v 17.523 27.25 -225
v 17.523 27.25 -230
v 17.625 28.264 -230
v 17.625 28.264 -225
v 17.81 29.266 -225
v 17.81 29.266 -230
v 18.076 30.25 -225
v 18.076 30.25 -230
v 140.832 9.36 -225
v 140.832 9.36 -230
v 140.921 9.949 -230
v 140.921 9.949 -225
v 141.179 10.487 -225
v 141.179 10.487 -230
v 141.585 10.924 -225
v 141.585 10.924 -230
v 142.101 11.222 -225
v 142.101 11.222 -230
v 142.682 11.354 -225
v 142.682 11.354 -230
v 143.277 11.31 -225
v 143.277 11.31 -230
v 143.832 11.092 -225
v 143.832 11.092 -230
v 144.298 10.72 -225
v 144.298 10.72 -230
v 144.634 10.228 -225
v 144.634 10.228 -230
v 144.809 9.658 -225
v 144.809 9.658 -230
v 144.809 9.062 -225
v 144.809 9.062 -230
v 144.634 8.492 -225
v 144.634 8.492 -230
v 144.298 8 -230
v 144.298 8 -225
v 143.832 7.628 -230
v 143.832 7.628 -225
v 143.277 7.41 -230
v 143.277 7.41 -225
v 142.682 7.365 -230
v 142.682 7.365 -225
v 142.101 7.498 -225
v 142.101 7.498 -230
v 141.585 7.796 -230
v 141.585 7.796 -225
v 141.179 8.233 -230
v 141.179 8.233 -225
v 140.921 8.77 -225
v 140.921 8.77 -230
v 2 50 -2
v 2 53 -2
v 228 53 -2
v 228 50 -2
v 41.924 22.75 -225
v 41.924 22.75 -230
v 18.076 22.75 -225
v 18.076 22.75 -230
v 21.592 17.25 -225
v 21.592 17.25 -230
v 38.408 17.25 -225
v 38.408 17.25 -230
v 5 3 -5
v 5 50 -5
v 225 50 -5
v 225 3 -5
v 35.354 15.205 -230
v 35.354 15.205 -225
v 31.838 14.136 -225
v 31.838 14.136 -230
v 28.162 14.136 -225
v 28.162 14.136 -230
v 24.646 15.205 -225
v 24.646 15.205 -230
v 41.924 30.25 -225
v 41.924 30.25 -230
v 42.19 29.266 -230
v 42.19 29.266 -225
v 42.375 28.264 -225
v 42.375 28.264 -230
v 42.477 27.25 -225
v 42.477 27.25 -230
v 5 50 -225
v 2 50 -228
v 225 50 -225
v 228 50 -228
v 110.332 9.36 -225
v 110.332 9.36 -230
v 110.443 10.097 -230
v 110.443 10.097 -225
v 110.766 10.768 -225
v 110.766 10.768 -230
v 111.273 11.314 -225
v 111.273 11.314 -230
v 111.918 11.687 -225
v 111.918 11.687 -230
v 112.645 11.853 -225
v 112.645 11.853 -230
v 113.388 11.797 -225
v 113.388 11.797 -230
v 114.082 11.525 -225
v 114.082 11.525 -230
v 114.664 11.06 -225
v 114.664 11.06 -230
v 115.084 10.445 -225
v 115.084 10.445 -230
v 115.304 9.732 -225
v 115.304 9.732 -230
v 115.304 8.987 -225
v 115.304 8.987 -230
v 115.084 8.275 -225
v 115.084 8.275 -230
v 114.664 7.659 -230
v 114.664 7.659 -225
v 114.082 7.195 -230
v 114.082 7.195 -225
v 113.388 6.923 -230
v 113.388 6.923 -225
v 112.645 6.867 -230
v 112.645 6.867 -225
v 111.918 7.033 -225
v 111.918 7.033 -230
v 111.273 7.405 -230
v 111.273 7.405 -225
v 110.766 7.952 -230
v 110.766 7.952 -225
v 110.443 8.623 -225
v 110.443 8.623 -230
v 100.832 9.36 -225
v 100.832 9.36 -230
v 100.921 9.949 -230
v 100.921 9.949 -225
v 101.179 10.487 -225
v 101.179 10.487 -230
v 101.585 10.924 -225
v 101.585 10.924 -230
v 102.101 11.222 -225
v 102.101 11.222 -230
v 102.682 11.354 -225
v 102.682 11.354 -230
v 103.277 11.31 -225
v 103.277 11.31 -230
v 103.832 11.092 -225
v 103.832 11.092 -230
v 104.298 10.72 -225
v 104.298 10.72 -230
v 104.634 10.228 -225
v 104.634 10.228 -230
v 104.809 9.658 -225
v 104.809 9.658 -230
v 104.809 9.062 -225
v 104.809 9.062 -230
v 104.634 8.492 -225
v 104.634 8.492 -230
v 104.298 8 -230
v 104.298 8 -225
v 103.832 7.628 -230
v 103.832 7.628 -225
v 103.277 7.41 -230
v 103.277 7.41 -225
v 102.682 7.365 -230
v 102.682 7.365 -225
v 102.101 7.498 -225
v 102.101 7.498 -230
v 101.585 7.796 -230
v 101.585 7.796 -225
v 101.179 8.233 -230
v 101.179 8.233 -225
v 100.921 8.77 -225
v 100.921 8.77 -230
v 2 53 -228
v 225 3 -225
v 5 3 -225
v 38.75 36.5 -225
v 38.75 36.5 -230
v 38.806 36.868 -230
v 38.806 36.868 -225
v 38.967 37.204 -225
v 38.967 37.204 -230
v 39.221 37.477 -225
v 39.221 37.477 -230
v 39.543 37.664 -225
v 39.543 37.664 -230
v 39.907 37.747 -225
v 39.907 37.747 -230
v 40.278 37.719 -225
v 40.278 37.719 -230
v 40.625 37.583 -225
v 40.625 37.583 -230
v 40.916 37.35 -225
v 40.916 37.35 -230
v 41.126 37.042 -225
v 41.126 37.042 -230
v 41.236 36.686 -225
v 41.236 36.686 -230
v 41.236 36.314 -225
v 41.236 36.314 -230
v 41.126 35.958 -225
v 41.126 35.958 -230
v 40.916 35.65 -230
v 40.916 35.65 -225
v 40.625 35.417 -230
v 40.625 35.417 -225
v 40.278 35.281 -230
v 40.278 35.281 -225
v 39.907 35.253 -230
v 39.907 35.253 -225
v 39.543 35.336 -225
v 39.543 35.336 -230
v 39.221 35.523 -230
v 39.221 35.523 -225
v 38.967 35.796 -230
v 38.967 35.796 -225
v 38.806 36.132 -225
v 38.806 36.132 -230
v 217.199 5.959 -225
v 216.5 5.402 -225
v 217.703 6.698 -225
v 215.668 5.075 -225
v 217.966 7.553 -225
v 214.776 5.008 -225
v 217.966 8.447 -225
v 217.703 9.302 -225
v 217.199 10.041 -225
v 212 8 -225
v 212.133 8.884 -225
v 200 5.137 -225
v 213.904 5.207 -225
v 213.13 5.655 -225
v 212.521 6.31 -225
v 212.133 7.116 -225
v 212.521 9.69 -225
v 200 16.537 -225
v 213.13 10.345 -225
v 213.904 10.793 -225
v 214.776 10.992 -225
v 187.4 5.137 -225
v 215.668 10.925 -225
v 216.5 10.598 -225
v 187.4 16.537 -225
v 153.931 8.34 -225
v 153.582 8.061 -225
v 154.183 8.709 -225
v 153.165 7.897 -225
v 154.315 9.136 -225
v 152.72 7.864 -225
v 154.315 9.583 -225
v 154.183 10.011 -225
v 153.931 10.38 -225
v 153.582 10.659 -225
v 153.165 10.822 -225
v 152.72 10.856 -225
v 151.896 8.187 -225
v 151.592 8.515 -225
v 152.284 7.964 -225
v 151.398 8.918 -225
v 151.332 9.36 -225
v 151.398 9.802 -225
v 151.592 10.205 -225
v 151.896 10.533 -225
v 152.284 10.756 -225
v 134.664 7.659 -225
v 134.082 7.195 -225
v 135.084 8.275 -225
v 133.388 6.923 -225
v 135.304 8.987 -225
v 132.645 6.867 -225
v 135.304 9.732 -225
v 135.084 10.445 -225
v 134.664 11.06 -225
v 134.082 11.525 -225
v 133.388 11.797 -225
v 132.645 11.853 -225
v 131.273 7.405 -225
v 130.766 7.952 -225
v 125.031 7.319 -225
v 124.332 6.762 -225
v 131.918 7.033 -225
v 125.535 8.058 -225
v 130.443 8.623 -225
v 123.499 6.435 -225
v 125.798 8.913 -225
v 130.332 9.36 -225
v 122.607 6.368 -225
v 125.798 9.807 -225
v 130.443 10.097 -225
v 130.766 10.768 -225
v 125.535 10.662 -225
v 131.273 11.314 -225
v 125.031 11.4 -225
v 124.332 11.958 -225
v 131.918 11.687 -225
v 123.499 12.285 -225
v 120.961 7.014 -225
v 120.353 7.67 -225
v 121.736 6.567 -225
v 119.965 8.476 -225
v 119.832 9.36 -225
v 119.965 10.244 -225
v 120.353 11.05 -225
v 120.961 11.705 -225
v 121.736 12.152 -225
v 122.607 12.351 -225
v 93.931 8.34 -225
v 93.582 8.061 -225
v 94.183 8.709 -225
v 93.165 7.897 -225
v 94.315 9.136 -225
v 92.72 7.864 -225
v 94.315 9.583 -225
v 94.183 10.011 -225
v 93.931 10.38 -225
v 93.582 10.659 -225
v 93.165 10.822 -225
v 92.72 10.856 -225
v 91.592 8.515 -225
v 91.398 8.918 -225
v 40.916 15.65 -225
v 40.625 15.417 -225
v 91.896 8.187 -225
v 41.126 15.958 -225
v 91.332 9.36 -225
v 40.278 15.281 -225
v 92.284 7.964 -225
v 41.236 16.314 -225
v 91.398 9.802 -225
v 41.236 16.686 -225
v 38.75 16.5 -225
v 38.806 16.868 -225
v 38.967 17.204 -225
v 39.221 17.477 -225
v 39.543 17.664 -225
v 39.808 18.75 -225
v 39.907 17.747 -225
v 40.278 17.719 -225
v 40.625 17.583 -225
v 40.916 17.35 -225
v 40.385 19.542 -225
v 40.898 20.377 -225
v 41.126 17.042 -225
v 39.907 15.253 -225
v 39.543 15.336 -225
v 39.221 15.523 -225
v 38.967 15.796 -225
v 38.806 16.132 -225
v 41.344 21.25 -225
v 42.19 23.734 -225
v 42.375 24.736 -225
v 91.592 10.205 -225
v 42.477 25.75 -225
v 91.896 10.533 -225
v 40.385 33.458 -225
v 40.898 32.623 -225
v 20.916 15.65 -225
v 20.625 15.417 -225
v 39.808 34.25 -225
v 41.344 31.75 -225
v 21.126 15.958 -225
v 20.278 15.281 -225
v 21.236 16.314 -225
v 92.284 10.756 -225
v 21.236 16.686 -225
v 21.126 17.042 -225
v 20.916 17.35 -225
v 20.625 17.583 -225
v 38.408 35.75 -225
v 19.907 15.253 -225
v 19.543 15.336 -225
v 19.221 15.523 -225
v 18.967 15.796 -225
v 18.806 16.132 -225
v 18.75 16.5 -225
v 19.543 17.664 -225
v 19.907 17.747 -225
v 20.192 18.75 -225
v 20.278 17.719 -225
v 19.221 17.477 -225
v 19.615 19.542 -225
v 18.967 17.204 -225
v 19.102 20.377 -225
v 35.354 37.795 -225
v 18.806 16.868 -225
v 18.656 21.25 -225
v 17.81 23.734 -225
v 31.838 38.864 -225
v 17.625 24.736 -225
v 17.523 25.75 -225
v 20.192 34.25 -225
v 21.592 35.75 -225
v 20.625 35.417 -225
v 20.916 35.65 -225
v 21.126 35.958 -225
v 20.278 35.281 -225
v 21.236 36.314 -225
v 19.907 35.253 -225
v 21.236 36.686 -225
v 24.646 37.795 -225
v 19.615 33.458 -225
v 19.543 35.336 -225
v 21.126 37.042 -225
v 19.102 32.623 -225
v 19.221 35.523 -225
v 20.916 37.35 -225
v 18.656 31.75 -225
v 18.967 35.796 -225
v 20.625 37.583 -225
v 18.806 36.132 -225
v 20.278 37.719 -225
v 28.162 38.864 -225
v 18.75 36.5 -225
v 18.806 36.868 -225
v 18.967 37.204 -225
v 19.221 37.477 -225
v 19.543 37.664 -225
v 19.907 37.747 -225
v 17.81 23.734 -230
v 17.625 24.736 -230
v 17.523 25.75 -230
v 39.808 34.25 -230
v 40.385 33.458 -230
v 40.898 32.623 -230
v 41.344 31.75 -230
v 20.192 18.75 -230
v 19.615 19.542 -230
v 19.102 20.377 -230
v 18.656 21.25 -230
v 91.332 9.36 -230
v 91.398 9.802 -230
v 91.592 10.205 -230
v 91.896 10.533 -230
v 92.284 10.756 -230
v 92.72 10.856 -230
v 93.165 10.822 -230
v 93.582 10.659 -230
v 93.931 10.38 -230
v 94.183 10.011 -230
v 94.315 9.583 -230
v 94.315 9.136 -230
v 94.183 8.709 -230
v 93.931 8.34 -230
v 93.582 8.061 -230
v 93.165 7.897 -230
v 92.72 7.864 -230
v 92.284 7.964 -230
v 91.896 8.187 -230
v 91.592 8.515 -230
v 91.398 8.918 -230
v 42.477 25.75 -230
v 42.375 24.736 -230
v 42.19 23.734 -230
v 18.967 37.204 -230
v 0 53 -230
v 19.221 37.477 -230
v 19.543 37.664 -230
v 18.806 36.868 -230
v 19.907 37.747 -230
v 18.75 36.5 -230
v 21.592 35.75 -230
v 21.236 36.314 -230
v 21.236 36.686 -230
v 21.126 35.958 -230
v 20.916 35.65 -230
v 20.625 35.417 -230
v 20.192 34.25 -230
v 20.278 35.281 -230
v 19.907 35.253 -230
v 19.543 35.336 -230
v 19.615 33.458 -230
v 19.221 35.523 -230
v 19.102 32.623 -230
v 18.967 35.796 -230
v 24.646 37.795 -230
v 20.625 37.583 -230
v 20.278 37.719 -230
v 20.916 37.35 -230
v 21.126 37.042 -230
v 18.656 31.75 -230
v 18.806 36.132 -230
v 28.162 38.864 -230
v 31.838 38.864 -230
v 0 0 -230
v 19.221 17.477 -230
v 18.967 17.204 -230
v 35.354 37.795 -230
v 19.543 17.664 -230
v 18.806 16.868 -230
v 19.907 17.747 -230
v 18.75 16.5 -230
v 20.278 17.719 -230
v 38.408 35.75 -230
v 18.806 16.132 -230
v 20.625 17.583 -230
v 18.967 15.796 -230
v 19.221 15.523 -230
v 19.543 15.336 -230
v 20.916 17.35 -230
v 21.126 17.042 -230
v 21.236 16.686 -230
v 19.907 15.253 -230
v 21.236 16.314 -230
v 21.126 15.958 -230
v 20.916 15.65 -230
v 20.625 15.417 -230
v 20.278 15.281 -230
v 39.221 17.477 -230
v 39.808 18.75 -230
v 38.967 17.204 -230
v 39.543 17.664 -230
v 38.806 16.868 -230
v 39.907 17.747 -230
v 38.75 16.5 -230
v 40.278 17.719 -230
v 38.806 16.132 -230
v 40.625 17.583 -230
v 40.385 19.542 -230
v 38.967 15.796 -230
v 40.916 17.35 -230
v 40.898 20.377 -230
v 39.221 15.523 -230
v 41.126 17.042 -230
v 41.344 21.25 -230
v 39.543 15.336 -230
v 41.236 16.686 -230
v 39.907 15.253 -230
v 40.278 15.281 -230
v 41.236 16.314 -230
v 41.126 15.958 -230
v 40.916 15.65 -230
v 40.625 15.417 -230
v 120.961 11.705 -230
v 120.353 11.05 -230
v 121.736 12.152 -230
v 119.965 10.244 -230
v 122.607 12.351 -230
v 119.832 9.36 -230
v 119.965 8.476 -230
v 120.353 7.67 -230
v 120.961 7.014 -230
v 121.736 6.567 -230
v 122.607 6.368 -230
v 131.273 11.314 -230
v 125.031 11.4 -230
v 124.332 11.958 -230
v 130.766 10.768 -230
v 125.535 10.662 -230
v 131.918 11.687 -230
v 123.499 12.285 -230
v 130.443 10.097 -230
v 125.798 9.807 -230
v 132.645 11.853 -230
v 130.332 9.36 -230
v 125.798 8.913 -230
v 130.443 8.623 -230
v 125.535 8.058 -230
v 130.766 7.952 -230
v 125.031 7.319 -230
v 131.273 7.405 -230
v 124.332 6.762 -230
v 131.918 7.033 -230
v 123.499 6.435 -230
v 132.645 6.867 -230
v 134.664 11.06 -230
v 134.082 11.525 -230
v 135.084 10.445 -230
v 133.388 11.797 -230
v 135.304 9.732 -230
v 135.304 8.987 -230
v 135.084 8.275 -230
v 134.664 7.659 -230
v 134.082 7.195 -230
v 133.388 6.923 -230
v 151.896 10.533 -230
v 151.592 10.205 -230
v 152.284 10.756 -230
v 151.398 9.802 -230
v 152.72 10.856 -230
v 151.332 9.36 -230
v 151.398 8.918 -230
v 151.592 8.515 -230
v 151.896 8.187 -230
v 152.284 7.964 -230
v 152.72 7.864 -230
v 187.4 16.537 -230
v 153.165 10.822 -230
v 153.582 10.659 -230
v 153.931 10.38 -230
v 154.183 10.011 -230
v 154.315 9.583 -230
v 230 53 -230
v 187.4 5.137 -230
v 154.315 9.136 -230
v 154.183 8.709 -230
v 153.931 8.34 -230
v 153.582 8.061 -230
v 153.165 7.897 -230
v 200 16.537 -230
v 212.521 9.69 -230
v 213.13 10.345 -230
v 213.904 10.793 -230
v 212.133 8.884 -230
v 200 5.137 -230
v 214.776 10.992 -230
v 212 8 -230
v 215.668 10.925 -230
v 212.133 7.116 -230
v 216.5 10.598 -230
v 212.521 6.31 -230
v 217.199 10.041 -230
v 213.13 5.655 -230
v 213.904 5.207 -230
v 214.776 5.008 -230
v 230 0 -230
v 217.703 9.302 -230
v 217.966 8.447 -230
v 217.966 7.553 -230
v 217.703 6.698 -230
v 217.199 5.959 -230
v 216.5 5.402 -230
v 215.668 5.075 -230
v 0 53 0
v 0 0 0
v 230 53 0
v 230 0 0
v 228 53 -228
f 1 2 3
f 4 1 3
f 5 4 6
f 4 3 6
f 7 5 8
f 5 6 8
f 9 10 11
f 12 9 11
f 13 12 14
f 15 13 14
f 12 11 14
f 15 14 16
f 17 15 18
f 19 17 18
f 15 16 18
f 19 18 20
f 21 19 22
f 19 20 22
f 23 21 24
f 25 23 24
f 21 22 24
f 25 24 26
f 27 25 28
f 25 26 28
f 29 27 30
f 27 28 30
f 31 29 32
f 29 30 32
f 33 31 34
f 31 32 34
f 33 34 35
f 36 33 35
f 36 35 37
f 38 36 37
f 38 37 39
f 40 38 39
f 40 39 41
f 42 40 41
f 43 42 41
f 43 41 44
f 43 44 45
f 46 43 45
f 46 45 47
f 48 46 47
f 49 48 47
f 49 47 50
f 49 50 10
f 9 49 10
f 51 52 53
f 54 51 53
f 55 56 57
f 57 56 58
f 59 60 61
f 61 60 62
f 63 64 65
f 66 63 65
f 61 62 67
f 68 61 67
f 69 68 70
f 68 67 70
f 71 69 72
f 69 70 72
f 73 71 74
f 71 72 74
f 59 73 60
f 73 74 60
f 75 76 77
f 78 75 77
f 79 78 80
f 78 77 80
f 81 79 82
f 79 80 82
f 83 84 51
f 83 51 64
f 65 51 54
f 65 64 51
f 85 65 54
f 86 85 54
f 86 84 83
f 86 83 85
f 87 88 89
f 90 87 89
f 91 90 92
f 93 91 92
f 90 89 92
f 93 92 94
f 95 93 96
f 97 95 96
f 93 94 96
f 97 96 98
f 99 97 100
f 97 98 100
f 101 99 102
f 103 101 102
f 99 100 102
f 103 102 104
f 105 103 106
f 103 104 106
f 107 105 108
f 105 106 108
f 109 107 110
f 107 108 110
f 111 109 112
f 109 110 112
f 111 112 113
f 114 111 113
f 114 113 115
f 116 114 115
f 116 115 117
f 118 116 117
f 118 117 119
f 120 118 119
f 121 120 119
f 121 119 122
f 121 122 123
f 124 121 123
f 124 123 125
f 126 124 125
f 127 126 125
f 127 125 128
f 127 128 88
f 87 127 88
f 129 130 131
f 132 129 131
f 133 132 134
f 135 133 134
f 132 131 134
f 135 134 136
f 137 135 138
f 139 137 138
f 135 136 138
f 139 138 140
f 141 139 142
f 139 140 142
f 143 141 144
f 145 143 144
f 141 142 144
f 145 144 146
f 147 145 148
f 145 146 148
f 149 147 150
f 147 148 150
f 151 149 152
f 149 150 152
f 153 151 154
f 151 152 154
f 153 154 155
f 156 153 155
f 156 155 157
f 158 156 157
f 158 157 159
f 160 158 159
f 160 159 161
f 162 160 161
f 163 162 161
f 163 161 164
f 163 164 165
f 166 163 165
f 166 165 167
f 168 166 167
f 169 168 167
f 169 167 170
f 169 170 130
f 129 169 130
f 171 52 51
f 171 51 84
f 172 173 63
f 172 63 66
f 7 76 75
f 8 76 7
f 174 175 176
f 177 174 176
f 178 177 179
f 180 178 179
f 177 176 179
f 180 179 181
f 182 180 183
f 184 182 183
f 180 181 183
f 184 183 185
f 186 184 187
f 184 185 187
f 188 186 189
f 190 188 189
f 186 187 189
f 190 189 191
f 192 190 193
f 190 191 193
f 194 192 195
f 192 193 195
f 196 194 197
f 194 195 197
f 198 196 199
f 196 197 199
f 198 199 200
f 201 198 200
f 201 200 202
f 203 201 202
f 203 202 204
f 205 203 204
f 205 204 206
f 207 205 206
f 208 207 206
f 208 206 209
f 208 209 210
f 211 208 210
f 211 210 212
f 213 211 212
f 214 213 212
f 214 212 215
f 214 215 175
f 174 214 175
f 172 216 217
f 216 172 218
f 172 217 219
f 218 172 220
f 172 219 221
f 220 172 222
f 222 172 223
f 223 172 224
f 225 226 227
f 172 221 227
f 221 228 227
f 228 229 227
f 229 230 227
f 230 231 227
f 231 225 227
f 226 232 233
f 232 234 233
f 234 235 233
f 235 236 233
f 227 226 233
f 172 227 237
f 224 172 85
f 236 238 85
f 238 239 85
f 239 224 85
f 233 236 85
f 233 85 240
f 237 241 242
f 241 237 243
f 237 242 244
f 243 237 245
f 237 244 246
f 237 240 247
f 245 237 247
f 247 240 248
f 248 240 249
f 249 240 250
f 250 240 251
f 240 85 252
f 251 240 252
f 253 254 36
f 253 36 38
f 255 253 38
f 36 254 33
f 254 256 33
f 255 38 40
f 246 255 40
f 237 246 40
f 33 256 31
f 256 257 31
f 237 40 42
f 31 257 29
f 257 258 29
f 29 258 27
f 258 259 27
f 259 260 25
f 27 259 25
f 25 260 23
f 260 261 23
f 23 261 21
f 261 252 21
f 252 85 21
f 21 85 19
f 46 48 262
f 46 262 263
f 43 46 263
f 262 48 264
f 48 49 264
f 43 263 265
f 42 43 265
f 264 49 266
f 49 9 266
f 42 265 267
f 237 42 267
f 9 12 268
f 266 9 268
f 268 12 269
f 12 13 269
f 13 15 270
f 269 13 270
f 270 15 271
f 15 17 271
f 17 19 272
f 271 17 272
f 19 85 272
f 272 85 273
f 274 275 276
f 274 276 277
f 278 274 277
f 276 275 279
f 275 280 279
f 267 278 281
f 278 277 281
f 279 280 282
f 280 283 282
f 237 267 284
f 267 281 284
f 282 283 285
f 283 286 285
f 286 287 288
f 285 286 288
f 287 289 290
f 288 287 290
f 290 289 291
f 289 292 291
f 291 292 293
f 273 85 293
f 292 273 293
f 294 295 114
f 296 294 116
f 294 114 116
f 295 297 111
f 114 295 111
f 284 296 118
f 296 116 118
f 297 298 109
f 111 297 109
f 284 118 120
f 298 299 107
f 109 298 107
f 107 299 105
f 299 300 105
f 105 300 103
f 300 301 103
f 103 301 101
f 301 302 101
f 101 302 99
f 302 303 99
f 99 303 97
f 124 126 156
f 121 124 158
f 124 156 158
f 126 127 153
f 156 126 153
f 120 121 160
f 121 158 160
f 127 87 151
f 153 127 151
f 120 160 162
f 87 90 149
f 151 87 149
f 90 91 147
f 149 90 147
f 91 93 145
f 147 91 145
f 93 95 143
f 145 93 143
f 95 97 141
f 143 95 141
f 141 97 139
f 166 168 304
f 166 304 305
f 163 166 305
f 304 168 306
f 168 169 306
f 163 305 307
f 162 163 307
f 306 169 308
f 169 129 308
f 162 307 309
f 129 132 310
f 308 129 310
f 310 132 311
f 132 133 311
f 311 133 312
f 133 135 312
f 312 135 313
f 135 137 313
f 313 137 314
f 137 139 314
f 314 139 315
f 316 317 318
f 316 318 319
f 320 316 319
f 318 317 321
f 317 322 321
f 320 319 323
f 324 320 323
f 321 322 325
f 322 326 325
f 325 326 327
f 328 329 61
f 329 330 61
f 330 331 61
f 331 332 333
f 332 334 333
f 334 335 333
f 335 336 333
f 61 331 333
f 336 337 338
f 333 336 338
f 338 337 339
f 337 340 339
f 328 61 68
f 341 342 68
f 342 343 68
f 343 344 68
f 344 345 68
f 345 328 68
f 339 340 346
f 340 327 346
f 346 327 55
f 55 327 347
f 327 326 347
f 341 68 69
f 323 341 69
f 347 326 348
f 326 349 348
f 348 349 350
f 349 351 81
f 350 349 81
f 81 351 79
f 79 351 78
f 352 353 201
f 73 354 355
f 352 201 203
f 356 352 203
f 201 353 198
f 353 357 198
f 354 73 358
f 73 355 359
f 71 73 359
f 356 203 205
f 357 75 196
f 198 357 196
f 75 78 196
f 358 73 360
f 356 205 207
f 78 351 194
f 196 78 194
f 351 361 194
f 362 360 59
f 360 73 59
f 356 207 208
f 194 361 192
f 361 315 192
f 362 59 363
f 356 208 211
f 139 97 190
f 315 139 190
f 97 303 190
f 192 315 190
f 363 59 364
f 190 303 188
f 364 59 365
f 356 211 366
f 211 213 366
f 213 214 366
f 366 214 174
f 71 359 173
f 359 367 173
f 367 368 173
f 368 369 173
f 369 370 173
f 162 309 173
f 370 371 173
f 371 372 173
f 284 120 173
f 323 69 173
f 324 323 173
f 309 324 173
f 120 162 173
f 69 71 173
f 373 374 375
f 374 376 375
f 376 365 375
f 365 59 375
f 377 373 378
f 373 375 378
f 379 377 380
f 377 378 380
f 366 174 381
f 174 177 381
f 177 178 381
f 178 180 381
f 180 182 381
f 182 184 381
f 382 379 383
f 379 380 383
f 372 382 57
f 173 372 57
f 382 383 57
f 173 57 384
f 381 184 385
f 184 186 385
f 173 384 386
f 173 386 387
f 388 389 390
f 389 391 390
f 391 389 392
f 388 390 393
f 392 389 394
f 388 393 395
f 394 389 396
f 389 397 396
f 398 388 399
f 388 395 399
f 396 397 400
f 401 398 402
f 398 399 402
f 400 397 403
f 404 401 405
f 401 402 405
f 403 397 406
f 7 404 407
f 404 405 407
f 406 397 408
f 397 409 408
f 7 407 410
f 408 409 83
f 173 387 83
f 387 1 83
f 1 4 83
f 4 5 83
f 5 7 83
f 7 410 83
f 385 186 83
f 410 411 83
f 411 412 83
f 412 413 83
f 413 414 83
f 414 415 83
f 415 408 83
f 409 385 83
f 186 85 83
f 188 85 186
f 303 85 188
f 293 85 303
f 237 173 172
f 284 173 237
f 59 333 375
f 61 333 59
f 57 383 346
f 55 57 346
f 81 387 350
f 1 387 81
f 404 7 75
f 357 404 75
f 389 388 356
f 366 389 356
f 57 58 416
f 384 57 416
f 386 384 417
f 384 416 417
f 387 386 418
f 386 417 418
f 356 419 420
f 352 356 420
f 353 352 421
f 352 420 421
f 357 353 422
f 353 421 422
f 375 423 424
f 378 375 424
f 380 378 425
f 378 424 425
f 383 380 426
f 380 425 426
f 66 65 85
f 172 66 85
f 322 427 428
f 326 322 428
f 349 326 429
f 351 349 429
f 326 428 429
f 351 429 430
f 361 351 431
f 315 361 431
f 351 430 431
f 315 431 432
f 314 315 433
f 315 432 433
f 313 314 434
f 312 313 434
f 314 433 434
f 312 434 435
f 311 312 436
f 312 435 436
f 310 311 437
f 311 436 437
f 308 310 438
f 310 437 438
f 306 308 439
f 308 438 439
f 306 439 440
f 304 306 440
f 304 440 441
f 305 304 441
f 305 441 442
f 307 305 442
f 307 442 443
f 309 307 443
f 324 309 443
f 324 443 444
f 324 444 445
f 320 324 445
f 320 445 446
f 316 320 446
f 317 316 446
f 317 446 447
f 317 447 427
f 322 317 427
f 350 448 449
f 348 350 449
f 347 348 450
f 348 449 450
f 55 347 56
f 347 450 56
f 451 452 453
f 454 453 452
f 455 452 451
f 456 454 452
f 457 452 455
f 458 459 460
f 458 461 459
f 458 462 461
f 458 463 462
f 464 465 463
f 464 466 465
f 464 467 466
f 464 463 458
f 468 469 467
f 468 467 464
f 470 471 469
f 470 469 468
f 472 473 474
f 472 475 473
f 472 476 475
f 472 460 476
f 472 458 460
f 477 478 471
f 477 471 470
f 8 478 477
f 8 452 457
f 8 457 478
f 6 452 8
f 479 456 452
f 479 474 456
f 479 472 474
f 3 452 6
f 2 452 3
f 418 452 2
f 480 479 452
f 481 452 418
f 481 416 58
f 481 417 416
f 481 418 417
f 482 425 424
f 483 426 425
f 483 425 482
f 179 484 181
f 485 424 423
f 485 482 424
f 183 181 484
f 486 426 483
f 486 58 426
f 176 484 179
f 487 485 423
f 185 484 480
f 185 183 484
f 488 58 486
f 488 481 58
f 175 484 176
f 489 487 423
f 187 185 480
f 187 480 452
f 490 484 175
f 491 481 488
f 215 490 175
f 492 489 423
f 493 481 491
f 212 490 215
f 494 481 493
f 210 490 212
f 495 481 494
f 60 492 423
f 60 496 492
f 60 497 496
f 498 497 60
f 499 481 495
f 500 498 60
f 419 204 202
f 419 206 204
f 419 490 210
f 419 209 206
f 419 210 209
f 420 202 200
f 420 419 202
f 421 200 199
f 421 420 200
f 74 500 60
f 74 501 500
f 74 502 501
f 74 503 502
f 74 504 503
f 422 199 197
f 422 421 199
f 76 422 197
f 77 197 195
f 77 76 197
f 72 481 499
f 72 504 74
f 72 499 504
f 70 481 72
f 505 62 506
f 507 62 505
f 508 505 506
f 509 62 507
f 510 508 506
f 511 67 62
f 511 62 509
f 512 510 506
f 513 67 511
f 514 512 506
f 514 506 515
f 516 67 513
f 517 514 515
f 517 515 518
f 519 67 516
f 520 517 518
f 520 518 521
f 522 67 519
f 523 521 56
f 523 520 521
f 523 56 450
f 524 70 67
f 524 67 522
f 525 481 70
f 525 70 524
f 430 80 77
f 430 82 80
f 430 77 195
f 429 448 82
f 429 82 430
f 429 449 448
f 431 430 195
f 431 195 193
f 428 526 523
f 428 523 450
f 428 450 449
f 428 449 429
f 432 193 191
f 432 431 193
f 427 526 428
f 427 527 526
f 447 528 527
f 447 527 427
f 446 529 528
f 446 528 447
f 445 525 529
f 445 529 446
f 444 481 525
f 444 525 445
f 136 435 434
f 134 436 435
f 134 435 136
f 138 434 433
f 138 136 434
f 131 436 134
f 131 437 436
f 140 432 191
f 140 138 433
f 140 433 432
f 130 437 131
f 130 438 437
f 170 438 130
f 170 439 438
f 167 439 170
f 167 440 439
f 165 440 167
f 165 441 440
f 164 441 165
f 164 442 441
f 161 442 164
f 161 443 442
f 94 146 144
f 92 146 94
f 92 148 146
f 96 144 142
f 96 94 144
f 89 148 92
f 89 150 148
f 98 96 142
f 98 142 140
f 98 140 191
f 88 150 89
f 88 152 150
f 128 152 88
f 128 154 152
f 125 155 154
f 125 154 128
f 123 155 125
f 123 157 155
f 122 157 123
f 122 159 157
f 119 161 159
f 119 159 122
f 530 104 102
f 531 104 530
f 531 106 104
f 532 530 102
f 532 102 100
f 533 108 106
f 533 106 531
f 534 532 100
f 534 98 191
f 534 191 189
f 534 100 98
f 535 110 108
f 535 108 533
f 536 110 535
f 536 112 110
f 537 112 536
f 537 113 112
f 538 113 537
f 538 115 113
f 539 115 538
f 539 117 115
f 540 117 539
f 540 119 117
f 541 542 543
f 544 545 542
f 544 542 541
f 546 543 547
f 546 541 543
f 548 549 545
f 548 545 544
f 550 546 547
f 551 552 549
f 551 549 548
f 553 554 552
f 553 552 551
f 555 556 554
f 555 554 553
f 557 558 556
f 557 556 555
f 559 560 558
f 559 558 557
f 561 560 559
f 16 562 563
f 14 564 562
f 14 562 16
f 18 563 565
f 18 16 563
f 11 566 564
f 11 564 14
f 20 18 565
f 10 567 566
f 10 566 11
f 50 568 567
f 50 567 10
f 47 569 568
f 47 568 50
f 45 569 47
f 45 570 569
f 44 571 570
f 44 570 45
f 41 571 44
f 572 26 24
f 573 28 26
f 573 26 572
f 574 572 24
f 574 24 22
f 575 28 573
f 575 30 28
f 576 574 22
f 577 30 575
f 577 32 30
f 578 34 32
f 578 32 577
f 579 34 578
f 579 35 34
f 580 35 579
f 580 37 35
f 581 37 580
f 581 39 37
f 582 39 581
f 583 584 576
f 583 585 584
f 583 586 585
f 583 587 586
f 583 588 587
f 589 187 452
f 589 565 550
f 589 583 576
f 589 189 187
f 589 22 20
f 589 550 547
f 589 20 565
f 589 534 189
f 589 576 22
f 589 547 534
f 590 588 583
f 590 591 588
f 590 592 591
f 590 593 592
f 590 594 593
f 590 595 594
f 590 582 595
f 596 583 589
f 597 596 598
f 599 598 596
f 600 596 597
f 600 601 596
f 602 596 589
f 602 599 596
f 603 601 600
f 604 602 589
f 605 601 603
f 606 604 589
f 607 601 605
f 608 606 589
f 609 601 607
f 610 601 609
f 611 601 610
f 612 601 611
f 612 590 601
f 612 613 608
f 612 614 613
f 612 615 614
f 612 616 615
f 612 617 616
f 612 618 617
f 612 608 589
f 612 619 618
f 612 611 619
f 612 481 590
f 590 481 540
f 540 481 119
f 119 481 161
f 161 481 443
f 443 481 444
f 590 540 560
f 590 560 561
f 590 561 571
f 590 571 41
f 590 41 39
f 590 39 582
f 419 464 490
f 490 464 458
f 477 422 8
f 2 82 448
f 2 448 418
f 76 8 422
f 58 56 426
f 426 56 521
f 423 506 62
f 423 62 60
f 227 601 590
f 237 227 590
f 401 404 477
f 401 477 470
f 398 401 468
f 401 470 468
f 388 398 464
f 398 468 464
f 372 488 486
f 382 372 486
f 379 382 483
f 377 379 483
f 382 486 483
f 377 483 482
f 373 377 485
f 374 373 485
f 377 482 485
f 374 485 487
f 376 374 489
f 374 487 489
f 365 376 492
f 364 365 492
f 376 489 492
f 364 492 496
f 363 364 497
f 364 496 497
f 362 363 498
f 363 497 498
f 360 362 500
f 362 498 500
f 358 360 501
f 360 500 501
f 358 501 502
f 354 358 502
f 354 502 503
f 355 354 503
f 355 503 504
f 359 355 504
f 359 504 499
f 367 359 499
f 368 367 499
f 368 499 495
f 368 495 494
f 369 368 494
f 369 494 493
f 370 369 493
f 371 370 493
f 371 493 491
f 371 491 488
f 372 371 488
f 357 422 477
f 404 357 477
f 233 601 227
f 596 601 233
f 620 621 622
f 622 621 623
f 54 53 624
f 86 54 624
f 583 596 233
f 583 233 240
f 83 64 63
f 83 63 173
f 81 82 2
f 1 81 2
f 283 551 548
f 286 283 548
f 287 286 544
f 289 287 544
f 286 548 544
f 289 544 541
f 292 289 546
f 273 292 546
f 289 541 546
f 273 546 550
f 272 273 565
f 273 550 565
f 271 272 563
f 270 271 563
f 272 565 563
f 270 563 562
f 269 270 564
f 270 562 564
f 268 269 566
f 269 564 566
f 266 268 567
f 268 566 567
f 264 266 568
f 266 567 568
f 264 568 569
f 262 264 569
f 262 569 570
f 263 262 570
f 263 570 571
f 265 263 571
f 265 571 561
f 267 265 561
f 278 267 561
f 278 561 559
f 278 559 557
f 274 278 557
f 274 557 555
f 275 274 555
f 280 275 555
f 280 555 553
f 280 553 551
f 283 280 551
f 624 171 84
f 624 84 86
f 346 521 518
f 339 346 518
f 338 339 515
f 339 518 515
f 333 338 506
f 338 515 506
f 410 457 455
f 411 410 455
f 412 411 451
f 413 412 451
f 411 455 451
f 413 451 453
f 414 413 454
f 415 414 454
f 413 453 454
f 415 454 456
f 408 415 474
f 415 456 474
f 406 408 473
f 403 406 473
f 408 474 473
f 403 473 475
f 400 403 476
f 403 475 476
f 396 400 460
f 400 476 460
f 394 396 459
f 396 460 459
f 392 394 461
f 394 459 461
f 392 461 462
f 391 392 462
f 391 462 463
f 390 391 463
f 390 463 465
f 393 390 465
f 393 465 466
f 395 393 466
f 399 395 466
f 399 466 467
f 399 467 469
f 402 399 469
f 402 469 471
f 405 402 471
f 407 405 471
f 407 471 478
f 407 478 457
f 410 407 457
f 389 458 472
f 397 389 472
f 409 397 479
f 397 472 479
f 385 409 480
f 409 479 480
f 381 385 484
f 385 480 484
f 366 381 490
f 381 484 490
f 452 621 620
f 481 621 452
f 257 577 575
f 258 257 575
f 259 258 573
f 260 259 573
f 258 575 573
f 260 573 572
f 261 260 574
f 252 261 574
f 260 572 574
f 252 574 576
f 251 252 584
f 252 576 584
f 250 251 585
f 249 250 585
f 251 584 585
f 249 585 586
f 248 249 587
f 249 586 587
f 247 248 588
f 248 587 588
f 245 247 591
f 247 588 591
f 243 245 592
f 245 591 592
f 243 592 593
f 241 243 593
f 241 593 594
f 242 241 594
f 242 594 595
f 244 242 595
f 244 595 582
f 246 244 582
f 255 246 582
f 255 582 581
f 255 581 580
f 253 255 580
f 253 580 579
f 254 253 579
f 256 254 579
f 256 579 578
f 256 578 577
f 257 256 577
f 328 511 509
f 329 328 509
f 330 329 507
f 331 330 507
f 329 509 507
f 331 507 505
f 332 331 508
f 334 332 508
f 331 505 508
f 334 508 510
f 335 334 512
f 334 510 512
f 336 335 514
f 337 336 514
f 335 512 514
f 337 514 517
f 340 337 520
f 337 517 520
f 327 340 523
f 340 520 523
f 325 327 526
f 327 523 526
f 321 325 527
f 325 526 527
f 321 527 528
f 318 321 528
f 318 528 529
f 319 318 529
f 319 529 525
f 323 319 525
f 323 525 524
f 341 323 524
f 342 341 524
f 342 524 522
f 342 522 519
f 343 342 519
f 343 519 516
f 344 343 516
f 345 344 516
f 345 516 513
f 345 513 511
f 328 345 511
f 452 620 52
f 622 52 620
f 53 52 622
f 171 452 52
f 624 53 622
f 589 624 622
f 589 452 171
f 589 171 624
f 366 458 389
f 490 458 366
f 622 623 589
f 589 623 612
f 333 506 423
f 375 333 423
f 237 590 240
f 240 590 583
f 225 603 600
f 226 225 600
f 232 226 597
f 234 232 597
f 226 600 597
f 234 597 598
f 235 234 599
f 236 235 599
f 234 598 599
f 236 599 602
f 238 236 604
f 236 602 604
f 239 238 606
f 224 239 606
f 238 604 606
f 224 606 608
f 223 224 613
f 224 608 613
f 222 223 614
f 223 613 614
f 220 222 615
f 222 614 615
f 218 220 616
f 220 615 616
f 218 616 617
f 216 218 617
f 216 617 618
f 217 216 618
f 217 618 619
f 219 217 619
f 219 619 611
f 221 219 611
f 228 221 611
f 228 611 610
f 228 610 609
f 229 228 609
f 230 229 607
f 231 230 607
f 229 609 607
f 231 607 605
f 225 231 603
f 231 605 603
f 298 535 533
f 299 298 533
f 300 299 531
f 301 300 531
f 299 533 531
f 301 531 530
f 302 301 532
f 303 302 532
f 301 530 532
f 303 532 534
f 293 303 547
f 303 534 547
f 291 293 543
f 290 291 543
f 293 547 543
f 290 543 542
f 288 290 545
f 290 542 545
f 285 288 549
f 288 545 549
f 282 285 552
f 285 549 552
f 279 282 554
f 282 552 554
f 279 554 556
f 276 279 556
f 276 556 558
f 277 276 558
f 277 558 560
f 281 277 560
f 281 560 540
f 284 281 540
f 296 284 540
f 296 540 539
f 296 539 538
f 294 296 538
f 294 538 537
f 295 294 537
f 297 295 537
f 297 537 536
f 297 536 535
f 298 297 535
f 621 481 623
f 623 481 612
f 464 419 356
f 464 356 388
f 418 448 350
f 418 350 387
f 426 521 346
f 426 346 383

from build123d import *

# Parameters (mm, degrees)
ESQUISSE1_W             = 230
ESQUISSE1_H             = 230
BOSS_EXTRU_1_DEPTH      = 53
ESQUISSE2_W             = 220
ESQUISSE2_H             = 220
ENL_V_MAT_EXTRU_1_DEPTH = 50
ESQUISSE3_W             = 226
ESQUISSE3_H             = 226
ENL_V_MAT_EXTRU_2_DEPTH = 3
ESQUISSE4_R             = 12.5
ENL_V_MAT_EXTRU_3_DEPTH = 13
ESQUISSE5_R             = 1.25
ENL_V_MAT_EXTRU_4_DEPTH = 13
ESQUISSE6_W             = 26.976344154
ESQUISSE6_H             = 1.5
ESQUISSE6_W_2           = 27.280131813
ESQUISSE6_W_3           = 27.280131814
BOSS_EXTRU_2_DEPTH      = 5
ESQUISSE7_R             = 3
ENL_V_MAT_EXTRU_5_DEPTH = 5
ESQUISSE9_W             = 12.6
ESQUISSE9_H             = 11.4
ENL_V_MAT_EXTRU_6_DEPTH = 5
ESQUISSE10_R            = 1.5
ESQUISSE10_R_2          = 2
ESQUISSE10_R_3          = 2.5
ESQUISSE10_R_4          = 3
ENL_V_MAT_EXTRU_7_DEPTH = 10


with BuildPart() as part:
    # Esquisse1 → Boss.-Extru.1 (new body)
    with BuildSketch(Plane(origin=(0, 0, 0), x_dir=(1, 0, 0), z_dir=(0, 1, 0))):
        with Locations((115, 115)):
            Rectangle(ESQUISSE1_W, ESQUISSE1_H)
    extrude(amount=BOSS_EXTRU_1_DEPTH)

    # Esquisse2 → Enlèv. mat.-Extru.1 (cut)
    with BuildSketch(Plane(origin=(0, 53, 0), x_dir=(1, 0, 0), z_dir=(0, 1, 0))):
        with Locations((115, 115)):
            Rectangle(ESQUISSE2_W, ESQUISSE2_H)
    extrude(amount=-ENL_V_MAT_EXTRU_1_DEPTH, mode=Mode.SUBTRACT)

    # Esquisse3 → Enlèv. mat.-Extru.2 (cut)
    with BuildSketch(Plane(origin=(0, 53, 0), x_dir=(1, 0, 0), z_dir=(0, 1, 0))):
        with Locations((115, 115)):
            Rectangle(ESQUISSE3_W, ESQUISSE3_H)
    extrude(amount=-ENL_V_MAT_EXTRU_2_DEPTH, mode=Mode.SUBTRACT)

    # Esquisse4 → Enlèv. mat.-Extru.3 (cut)
    with BuildSketch(Plane(origin=(0, 0, -230), x_dir=(-1, 0, 0), z_dir=(0, 0, -1))):
        with Locations((-30, 26.5)):
            Circle(ESQUISSE4_R)
    extrude(amount=-ENL_V_MAT_EXTRU_3_DEPTH, mode=Mode.SUBTRACT)

    # Esquisse5 → Enlèv. mat.-Extru.4 (cut)
    with BuildSketch(Plane(origin=(0, 0, -230), x_dir=(-1, 0, 0), z_dir=(0, 0, -1))):
        with Locations((-40, 36.5)):
            Circle(ESQUISSE5_R)
        with Locations((-20, 36.5)):
            Circle(ESQUISSE5_R)
        with Locations((-20, 16.5)):
            Circle(ESQUISSE5_R)
        with Locations((-40, 16.5)):
            Circle(ESQUISSE5_R)
    extrude(amount=-ENL_V_MAT_EXTRU_4_DEPTH, mode=Mode.SUBTRACT)

    # Esquisse6 → Boss.-Extru.2 (add)
    with BuildSketch(Plane(origin=(0, 0, -230), x_dir=(-1, 0, 0), z_dir=(0, 0, -1))):
        with Locations((-29.668195525, 26.5)):
            Rectangle(ESQUISSE6_W, ESQUISSE6_H)
        with Locations((-29.516301696, 31)):
            Rectangle(ESQUISSE6_W_2, ESQUISSE6_H)
        with BuildLine():
            Line((-39.807522623, 18.75), (-20.192477377, 18.75))
            add(Edge.make_bspline(
                [(-20.192477377, 18.75), (-20.3726905, 17.550508754), (-21.59241414, 17.25)],
                knots=[0, 0, 0, 1, 1, 1], degree=2))
            Line((-21.59241414, 17.25), (-38.40758586, 17.25))
            add(Edge.make_bspline(
                [(-39.807522623, 18.75), (-39.455191276, 17.680066298), (-38.40758586, 17.25)],
                knots=[0, 0, 0, 1, 1, 1], degree=2))
        make_face()
        with Locations((-29.303650334, 22)):
            Rectangle(ESQUISSE6_W_3, ESQUISSE6_H)
        with BuildLine():
            Line((-39.807522623, 34.25), (-20.192477377, 34.25))
            add(Edge.make_bspline(
                [(-21.59241414, 35.75), (-20.476912109, 35.349681649), (-20.192477377, 34.25)],
                knots=[0, 0, 0, 1, 1, 1], degree=2))
            Line((-21.59241414, 35.75), (-38.40758586, 35.75))
            add(Edge.make_bspline(
                [(-39.807522623, 34.25), (-39.526090214, 35.47410851), (-38.40758586, 35.75)],
                knots=[0, 0, 0, 1, 1, 1], degree=2))
        make_face()
    extrude(amount=-BOSS_EXTRU_2_DEPTH)

    # Esquisse7 → Enlèv. mat.-Extru.5 (cut)
    with BuildSketch(Plane(origin=(0, 0, -230), x_dir=(-1, 0, 0), z_dir=(0, 0, -1))):
        with Locations((-215, 8)):
            Circle(ESQUISSE7_R)
    extrude(amount=-ENL_V_MAT_EXTRU_5_DEPTH, mode=Mode.SUBTRACT)

    # Esquisse9 → Enlèv. mat.-Extru.6 (cut)
    with BuildSketch(Plane(origin=(0, 0, -230), x_dir=(-1, 0, 0), z_dir=(0, 0, -1))):
        with Locations((-193.7, 10.836521705)):
            Rectangle(ESQUISSE9_W, ESQUISSE9_H)
    extrude(amount=-ENL_V_MAT_EXTRU_6_DEPTH, mode=Mode.SUBTRACT)

    # Esquisse10 → Enlèv. mat.-Extru.7 (cut)
    with BuildSketch(Plane(origin=(0, 0, -230), x_dir=(-1, 0, 0), z_dir=(0, 0, -1))):
        with Locations((-152.831654842, 9.359863556)):
            Circle(ESQUISSE10_R)
        with Locations((-142.831654842, 9.359863556)):
            Circle(ESQUISSE10_R_2)
        with Locations((-132.831654842, 9.359863556)):
            Circle(ESQUISSE10_R_3)
        with Locations((-122.831654842, 9.359863556)):
            Circle(ESQUISSE10_R_4)
        with Locations((-112.831654842, 9.359863556)):
            Circle(ESQUISSE10_R_3)
        with Locations((-102.831654842, 9.359863556)):
            Circle(ESQUISSE10_R_2)
        with Locations((-92.831654842, 9.359863556)):
            Circle(ESQUISSE10_R)
    extrude(amount=-ENL_V_MAT_EXTRU_7_DEPTH, mode=Mode.SUBTRACT)


solid = part.part
